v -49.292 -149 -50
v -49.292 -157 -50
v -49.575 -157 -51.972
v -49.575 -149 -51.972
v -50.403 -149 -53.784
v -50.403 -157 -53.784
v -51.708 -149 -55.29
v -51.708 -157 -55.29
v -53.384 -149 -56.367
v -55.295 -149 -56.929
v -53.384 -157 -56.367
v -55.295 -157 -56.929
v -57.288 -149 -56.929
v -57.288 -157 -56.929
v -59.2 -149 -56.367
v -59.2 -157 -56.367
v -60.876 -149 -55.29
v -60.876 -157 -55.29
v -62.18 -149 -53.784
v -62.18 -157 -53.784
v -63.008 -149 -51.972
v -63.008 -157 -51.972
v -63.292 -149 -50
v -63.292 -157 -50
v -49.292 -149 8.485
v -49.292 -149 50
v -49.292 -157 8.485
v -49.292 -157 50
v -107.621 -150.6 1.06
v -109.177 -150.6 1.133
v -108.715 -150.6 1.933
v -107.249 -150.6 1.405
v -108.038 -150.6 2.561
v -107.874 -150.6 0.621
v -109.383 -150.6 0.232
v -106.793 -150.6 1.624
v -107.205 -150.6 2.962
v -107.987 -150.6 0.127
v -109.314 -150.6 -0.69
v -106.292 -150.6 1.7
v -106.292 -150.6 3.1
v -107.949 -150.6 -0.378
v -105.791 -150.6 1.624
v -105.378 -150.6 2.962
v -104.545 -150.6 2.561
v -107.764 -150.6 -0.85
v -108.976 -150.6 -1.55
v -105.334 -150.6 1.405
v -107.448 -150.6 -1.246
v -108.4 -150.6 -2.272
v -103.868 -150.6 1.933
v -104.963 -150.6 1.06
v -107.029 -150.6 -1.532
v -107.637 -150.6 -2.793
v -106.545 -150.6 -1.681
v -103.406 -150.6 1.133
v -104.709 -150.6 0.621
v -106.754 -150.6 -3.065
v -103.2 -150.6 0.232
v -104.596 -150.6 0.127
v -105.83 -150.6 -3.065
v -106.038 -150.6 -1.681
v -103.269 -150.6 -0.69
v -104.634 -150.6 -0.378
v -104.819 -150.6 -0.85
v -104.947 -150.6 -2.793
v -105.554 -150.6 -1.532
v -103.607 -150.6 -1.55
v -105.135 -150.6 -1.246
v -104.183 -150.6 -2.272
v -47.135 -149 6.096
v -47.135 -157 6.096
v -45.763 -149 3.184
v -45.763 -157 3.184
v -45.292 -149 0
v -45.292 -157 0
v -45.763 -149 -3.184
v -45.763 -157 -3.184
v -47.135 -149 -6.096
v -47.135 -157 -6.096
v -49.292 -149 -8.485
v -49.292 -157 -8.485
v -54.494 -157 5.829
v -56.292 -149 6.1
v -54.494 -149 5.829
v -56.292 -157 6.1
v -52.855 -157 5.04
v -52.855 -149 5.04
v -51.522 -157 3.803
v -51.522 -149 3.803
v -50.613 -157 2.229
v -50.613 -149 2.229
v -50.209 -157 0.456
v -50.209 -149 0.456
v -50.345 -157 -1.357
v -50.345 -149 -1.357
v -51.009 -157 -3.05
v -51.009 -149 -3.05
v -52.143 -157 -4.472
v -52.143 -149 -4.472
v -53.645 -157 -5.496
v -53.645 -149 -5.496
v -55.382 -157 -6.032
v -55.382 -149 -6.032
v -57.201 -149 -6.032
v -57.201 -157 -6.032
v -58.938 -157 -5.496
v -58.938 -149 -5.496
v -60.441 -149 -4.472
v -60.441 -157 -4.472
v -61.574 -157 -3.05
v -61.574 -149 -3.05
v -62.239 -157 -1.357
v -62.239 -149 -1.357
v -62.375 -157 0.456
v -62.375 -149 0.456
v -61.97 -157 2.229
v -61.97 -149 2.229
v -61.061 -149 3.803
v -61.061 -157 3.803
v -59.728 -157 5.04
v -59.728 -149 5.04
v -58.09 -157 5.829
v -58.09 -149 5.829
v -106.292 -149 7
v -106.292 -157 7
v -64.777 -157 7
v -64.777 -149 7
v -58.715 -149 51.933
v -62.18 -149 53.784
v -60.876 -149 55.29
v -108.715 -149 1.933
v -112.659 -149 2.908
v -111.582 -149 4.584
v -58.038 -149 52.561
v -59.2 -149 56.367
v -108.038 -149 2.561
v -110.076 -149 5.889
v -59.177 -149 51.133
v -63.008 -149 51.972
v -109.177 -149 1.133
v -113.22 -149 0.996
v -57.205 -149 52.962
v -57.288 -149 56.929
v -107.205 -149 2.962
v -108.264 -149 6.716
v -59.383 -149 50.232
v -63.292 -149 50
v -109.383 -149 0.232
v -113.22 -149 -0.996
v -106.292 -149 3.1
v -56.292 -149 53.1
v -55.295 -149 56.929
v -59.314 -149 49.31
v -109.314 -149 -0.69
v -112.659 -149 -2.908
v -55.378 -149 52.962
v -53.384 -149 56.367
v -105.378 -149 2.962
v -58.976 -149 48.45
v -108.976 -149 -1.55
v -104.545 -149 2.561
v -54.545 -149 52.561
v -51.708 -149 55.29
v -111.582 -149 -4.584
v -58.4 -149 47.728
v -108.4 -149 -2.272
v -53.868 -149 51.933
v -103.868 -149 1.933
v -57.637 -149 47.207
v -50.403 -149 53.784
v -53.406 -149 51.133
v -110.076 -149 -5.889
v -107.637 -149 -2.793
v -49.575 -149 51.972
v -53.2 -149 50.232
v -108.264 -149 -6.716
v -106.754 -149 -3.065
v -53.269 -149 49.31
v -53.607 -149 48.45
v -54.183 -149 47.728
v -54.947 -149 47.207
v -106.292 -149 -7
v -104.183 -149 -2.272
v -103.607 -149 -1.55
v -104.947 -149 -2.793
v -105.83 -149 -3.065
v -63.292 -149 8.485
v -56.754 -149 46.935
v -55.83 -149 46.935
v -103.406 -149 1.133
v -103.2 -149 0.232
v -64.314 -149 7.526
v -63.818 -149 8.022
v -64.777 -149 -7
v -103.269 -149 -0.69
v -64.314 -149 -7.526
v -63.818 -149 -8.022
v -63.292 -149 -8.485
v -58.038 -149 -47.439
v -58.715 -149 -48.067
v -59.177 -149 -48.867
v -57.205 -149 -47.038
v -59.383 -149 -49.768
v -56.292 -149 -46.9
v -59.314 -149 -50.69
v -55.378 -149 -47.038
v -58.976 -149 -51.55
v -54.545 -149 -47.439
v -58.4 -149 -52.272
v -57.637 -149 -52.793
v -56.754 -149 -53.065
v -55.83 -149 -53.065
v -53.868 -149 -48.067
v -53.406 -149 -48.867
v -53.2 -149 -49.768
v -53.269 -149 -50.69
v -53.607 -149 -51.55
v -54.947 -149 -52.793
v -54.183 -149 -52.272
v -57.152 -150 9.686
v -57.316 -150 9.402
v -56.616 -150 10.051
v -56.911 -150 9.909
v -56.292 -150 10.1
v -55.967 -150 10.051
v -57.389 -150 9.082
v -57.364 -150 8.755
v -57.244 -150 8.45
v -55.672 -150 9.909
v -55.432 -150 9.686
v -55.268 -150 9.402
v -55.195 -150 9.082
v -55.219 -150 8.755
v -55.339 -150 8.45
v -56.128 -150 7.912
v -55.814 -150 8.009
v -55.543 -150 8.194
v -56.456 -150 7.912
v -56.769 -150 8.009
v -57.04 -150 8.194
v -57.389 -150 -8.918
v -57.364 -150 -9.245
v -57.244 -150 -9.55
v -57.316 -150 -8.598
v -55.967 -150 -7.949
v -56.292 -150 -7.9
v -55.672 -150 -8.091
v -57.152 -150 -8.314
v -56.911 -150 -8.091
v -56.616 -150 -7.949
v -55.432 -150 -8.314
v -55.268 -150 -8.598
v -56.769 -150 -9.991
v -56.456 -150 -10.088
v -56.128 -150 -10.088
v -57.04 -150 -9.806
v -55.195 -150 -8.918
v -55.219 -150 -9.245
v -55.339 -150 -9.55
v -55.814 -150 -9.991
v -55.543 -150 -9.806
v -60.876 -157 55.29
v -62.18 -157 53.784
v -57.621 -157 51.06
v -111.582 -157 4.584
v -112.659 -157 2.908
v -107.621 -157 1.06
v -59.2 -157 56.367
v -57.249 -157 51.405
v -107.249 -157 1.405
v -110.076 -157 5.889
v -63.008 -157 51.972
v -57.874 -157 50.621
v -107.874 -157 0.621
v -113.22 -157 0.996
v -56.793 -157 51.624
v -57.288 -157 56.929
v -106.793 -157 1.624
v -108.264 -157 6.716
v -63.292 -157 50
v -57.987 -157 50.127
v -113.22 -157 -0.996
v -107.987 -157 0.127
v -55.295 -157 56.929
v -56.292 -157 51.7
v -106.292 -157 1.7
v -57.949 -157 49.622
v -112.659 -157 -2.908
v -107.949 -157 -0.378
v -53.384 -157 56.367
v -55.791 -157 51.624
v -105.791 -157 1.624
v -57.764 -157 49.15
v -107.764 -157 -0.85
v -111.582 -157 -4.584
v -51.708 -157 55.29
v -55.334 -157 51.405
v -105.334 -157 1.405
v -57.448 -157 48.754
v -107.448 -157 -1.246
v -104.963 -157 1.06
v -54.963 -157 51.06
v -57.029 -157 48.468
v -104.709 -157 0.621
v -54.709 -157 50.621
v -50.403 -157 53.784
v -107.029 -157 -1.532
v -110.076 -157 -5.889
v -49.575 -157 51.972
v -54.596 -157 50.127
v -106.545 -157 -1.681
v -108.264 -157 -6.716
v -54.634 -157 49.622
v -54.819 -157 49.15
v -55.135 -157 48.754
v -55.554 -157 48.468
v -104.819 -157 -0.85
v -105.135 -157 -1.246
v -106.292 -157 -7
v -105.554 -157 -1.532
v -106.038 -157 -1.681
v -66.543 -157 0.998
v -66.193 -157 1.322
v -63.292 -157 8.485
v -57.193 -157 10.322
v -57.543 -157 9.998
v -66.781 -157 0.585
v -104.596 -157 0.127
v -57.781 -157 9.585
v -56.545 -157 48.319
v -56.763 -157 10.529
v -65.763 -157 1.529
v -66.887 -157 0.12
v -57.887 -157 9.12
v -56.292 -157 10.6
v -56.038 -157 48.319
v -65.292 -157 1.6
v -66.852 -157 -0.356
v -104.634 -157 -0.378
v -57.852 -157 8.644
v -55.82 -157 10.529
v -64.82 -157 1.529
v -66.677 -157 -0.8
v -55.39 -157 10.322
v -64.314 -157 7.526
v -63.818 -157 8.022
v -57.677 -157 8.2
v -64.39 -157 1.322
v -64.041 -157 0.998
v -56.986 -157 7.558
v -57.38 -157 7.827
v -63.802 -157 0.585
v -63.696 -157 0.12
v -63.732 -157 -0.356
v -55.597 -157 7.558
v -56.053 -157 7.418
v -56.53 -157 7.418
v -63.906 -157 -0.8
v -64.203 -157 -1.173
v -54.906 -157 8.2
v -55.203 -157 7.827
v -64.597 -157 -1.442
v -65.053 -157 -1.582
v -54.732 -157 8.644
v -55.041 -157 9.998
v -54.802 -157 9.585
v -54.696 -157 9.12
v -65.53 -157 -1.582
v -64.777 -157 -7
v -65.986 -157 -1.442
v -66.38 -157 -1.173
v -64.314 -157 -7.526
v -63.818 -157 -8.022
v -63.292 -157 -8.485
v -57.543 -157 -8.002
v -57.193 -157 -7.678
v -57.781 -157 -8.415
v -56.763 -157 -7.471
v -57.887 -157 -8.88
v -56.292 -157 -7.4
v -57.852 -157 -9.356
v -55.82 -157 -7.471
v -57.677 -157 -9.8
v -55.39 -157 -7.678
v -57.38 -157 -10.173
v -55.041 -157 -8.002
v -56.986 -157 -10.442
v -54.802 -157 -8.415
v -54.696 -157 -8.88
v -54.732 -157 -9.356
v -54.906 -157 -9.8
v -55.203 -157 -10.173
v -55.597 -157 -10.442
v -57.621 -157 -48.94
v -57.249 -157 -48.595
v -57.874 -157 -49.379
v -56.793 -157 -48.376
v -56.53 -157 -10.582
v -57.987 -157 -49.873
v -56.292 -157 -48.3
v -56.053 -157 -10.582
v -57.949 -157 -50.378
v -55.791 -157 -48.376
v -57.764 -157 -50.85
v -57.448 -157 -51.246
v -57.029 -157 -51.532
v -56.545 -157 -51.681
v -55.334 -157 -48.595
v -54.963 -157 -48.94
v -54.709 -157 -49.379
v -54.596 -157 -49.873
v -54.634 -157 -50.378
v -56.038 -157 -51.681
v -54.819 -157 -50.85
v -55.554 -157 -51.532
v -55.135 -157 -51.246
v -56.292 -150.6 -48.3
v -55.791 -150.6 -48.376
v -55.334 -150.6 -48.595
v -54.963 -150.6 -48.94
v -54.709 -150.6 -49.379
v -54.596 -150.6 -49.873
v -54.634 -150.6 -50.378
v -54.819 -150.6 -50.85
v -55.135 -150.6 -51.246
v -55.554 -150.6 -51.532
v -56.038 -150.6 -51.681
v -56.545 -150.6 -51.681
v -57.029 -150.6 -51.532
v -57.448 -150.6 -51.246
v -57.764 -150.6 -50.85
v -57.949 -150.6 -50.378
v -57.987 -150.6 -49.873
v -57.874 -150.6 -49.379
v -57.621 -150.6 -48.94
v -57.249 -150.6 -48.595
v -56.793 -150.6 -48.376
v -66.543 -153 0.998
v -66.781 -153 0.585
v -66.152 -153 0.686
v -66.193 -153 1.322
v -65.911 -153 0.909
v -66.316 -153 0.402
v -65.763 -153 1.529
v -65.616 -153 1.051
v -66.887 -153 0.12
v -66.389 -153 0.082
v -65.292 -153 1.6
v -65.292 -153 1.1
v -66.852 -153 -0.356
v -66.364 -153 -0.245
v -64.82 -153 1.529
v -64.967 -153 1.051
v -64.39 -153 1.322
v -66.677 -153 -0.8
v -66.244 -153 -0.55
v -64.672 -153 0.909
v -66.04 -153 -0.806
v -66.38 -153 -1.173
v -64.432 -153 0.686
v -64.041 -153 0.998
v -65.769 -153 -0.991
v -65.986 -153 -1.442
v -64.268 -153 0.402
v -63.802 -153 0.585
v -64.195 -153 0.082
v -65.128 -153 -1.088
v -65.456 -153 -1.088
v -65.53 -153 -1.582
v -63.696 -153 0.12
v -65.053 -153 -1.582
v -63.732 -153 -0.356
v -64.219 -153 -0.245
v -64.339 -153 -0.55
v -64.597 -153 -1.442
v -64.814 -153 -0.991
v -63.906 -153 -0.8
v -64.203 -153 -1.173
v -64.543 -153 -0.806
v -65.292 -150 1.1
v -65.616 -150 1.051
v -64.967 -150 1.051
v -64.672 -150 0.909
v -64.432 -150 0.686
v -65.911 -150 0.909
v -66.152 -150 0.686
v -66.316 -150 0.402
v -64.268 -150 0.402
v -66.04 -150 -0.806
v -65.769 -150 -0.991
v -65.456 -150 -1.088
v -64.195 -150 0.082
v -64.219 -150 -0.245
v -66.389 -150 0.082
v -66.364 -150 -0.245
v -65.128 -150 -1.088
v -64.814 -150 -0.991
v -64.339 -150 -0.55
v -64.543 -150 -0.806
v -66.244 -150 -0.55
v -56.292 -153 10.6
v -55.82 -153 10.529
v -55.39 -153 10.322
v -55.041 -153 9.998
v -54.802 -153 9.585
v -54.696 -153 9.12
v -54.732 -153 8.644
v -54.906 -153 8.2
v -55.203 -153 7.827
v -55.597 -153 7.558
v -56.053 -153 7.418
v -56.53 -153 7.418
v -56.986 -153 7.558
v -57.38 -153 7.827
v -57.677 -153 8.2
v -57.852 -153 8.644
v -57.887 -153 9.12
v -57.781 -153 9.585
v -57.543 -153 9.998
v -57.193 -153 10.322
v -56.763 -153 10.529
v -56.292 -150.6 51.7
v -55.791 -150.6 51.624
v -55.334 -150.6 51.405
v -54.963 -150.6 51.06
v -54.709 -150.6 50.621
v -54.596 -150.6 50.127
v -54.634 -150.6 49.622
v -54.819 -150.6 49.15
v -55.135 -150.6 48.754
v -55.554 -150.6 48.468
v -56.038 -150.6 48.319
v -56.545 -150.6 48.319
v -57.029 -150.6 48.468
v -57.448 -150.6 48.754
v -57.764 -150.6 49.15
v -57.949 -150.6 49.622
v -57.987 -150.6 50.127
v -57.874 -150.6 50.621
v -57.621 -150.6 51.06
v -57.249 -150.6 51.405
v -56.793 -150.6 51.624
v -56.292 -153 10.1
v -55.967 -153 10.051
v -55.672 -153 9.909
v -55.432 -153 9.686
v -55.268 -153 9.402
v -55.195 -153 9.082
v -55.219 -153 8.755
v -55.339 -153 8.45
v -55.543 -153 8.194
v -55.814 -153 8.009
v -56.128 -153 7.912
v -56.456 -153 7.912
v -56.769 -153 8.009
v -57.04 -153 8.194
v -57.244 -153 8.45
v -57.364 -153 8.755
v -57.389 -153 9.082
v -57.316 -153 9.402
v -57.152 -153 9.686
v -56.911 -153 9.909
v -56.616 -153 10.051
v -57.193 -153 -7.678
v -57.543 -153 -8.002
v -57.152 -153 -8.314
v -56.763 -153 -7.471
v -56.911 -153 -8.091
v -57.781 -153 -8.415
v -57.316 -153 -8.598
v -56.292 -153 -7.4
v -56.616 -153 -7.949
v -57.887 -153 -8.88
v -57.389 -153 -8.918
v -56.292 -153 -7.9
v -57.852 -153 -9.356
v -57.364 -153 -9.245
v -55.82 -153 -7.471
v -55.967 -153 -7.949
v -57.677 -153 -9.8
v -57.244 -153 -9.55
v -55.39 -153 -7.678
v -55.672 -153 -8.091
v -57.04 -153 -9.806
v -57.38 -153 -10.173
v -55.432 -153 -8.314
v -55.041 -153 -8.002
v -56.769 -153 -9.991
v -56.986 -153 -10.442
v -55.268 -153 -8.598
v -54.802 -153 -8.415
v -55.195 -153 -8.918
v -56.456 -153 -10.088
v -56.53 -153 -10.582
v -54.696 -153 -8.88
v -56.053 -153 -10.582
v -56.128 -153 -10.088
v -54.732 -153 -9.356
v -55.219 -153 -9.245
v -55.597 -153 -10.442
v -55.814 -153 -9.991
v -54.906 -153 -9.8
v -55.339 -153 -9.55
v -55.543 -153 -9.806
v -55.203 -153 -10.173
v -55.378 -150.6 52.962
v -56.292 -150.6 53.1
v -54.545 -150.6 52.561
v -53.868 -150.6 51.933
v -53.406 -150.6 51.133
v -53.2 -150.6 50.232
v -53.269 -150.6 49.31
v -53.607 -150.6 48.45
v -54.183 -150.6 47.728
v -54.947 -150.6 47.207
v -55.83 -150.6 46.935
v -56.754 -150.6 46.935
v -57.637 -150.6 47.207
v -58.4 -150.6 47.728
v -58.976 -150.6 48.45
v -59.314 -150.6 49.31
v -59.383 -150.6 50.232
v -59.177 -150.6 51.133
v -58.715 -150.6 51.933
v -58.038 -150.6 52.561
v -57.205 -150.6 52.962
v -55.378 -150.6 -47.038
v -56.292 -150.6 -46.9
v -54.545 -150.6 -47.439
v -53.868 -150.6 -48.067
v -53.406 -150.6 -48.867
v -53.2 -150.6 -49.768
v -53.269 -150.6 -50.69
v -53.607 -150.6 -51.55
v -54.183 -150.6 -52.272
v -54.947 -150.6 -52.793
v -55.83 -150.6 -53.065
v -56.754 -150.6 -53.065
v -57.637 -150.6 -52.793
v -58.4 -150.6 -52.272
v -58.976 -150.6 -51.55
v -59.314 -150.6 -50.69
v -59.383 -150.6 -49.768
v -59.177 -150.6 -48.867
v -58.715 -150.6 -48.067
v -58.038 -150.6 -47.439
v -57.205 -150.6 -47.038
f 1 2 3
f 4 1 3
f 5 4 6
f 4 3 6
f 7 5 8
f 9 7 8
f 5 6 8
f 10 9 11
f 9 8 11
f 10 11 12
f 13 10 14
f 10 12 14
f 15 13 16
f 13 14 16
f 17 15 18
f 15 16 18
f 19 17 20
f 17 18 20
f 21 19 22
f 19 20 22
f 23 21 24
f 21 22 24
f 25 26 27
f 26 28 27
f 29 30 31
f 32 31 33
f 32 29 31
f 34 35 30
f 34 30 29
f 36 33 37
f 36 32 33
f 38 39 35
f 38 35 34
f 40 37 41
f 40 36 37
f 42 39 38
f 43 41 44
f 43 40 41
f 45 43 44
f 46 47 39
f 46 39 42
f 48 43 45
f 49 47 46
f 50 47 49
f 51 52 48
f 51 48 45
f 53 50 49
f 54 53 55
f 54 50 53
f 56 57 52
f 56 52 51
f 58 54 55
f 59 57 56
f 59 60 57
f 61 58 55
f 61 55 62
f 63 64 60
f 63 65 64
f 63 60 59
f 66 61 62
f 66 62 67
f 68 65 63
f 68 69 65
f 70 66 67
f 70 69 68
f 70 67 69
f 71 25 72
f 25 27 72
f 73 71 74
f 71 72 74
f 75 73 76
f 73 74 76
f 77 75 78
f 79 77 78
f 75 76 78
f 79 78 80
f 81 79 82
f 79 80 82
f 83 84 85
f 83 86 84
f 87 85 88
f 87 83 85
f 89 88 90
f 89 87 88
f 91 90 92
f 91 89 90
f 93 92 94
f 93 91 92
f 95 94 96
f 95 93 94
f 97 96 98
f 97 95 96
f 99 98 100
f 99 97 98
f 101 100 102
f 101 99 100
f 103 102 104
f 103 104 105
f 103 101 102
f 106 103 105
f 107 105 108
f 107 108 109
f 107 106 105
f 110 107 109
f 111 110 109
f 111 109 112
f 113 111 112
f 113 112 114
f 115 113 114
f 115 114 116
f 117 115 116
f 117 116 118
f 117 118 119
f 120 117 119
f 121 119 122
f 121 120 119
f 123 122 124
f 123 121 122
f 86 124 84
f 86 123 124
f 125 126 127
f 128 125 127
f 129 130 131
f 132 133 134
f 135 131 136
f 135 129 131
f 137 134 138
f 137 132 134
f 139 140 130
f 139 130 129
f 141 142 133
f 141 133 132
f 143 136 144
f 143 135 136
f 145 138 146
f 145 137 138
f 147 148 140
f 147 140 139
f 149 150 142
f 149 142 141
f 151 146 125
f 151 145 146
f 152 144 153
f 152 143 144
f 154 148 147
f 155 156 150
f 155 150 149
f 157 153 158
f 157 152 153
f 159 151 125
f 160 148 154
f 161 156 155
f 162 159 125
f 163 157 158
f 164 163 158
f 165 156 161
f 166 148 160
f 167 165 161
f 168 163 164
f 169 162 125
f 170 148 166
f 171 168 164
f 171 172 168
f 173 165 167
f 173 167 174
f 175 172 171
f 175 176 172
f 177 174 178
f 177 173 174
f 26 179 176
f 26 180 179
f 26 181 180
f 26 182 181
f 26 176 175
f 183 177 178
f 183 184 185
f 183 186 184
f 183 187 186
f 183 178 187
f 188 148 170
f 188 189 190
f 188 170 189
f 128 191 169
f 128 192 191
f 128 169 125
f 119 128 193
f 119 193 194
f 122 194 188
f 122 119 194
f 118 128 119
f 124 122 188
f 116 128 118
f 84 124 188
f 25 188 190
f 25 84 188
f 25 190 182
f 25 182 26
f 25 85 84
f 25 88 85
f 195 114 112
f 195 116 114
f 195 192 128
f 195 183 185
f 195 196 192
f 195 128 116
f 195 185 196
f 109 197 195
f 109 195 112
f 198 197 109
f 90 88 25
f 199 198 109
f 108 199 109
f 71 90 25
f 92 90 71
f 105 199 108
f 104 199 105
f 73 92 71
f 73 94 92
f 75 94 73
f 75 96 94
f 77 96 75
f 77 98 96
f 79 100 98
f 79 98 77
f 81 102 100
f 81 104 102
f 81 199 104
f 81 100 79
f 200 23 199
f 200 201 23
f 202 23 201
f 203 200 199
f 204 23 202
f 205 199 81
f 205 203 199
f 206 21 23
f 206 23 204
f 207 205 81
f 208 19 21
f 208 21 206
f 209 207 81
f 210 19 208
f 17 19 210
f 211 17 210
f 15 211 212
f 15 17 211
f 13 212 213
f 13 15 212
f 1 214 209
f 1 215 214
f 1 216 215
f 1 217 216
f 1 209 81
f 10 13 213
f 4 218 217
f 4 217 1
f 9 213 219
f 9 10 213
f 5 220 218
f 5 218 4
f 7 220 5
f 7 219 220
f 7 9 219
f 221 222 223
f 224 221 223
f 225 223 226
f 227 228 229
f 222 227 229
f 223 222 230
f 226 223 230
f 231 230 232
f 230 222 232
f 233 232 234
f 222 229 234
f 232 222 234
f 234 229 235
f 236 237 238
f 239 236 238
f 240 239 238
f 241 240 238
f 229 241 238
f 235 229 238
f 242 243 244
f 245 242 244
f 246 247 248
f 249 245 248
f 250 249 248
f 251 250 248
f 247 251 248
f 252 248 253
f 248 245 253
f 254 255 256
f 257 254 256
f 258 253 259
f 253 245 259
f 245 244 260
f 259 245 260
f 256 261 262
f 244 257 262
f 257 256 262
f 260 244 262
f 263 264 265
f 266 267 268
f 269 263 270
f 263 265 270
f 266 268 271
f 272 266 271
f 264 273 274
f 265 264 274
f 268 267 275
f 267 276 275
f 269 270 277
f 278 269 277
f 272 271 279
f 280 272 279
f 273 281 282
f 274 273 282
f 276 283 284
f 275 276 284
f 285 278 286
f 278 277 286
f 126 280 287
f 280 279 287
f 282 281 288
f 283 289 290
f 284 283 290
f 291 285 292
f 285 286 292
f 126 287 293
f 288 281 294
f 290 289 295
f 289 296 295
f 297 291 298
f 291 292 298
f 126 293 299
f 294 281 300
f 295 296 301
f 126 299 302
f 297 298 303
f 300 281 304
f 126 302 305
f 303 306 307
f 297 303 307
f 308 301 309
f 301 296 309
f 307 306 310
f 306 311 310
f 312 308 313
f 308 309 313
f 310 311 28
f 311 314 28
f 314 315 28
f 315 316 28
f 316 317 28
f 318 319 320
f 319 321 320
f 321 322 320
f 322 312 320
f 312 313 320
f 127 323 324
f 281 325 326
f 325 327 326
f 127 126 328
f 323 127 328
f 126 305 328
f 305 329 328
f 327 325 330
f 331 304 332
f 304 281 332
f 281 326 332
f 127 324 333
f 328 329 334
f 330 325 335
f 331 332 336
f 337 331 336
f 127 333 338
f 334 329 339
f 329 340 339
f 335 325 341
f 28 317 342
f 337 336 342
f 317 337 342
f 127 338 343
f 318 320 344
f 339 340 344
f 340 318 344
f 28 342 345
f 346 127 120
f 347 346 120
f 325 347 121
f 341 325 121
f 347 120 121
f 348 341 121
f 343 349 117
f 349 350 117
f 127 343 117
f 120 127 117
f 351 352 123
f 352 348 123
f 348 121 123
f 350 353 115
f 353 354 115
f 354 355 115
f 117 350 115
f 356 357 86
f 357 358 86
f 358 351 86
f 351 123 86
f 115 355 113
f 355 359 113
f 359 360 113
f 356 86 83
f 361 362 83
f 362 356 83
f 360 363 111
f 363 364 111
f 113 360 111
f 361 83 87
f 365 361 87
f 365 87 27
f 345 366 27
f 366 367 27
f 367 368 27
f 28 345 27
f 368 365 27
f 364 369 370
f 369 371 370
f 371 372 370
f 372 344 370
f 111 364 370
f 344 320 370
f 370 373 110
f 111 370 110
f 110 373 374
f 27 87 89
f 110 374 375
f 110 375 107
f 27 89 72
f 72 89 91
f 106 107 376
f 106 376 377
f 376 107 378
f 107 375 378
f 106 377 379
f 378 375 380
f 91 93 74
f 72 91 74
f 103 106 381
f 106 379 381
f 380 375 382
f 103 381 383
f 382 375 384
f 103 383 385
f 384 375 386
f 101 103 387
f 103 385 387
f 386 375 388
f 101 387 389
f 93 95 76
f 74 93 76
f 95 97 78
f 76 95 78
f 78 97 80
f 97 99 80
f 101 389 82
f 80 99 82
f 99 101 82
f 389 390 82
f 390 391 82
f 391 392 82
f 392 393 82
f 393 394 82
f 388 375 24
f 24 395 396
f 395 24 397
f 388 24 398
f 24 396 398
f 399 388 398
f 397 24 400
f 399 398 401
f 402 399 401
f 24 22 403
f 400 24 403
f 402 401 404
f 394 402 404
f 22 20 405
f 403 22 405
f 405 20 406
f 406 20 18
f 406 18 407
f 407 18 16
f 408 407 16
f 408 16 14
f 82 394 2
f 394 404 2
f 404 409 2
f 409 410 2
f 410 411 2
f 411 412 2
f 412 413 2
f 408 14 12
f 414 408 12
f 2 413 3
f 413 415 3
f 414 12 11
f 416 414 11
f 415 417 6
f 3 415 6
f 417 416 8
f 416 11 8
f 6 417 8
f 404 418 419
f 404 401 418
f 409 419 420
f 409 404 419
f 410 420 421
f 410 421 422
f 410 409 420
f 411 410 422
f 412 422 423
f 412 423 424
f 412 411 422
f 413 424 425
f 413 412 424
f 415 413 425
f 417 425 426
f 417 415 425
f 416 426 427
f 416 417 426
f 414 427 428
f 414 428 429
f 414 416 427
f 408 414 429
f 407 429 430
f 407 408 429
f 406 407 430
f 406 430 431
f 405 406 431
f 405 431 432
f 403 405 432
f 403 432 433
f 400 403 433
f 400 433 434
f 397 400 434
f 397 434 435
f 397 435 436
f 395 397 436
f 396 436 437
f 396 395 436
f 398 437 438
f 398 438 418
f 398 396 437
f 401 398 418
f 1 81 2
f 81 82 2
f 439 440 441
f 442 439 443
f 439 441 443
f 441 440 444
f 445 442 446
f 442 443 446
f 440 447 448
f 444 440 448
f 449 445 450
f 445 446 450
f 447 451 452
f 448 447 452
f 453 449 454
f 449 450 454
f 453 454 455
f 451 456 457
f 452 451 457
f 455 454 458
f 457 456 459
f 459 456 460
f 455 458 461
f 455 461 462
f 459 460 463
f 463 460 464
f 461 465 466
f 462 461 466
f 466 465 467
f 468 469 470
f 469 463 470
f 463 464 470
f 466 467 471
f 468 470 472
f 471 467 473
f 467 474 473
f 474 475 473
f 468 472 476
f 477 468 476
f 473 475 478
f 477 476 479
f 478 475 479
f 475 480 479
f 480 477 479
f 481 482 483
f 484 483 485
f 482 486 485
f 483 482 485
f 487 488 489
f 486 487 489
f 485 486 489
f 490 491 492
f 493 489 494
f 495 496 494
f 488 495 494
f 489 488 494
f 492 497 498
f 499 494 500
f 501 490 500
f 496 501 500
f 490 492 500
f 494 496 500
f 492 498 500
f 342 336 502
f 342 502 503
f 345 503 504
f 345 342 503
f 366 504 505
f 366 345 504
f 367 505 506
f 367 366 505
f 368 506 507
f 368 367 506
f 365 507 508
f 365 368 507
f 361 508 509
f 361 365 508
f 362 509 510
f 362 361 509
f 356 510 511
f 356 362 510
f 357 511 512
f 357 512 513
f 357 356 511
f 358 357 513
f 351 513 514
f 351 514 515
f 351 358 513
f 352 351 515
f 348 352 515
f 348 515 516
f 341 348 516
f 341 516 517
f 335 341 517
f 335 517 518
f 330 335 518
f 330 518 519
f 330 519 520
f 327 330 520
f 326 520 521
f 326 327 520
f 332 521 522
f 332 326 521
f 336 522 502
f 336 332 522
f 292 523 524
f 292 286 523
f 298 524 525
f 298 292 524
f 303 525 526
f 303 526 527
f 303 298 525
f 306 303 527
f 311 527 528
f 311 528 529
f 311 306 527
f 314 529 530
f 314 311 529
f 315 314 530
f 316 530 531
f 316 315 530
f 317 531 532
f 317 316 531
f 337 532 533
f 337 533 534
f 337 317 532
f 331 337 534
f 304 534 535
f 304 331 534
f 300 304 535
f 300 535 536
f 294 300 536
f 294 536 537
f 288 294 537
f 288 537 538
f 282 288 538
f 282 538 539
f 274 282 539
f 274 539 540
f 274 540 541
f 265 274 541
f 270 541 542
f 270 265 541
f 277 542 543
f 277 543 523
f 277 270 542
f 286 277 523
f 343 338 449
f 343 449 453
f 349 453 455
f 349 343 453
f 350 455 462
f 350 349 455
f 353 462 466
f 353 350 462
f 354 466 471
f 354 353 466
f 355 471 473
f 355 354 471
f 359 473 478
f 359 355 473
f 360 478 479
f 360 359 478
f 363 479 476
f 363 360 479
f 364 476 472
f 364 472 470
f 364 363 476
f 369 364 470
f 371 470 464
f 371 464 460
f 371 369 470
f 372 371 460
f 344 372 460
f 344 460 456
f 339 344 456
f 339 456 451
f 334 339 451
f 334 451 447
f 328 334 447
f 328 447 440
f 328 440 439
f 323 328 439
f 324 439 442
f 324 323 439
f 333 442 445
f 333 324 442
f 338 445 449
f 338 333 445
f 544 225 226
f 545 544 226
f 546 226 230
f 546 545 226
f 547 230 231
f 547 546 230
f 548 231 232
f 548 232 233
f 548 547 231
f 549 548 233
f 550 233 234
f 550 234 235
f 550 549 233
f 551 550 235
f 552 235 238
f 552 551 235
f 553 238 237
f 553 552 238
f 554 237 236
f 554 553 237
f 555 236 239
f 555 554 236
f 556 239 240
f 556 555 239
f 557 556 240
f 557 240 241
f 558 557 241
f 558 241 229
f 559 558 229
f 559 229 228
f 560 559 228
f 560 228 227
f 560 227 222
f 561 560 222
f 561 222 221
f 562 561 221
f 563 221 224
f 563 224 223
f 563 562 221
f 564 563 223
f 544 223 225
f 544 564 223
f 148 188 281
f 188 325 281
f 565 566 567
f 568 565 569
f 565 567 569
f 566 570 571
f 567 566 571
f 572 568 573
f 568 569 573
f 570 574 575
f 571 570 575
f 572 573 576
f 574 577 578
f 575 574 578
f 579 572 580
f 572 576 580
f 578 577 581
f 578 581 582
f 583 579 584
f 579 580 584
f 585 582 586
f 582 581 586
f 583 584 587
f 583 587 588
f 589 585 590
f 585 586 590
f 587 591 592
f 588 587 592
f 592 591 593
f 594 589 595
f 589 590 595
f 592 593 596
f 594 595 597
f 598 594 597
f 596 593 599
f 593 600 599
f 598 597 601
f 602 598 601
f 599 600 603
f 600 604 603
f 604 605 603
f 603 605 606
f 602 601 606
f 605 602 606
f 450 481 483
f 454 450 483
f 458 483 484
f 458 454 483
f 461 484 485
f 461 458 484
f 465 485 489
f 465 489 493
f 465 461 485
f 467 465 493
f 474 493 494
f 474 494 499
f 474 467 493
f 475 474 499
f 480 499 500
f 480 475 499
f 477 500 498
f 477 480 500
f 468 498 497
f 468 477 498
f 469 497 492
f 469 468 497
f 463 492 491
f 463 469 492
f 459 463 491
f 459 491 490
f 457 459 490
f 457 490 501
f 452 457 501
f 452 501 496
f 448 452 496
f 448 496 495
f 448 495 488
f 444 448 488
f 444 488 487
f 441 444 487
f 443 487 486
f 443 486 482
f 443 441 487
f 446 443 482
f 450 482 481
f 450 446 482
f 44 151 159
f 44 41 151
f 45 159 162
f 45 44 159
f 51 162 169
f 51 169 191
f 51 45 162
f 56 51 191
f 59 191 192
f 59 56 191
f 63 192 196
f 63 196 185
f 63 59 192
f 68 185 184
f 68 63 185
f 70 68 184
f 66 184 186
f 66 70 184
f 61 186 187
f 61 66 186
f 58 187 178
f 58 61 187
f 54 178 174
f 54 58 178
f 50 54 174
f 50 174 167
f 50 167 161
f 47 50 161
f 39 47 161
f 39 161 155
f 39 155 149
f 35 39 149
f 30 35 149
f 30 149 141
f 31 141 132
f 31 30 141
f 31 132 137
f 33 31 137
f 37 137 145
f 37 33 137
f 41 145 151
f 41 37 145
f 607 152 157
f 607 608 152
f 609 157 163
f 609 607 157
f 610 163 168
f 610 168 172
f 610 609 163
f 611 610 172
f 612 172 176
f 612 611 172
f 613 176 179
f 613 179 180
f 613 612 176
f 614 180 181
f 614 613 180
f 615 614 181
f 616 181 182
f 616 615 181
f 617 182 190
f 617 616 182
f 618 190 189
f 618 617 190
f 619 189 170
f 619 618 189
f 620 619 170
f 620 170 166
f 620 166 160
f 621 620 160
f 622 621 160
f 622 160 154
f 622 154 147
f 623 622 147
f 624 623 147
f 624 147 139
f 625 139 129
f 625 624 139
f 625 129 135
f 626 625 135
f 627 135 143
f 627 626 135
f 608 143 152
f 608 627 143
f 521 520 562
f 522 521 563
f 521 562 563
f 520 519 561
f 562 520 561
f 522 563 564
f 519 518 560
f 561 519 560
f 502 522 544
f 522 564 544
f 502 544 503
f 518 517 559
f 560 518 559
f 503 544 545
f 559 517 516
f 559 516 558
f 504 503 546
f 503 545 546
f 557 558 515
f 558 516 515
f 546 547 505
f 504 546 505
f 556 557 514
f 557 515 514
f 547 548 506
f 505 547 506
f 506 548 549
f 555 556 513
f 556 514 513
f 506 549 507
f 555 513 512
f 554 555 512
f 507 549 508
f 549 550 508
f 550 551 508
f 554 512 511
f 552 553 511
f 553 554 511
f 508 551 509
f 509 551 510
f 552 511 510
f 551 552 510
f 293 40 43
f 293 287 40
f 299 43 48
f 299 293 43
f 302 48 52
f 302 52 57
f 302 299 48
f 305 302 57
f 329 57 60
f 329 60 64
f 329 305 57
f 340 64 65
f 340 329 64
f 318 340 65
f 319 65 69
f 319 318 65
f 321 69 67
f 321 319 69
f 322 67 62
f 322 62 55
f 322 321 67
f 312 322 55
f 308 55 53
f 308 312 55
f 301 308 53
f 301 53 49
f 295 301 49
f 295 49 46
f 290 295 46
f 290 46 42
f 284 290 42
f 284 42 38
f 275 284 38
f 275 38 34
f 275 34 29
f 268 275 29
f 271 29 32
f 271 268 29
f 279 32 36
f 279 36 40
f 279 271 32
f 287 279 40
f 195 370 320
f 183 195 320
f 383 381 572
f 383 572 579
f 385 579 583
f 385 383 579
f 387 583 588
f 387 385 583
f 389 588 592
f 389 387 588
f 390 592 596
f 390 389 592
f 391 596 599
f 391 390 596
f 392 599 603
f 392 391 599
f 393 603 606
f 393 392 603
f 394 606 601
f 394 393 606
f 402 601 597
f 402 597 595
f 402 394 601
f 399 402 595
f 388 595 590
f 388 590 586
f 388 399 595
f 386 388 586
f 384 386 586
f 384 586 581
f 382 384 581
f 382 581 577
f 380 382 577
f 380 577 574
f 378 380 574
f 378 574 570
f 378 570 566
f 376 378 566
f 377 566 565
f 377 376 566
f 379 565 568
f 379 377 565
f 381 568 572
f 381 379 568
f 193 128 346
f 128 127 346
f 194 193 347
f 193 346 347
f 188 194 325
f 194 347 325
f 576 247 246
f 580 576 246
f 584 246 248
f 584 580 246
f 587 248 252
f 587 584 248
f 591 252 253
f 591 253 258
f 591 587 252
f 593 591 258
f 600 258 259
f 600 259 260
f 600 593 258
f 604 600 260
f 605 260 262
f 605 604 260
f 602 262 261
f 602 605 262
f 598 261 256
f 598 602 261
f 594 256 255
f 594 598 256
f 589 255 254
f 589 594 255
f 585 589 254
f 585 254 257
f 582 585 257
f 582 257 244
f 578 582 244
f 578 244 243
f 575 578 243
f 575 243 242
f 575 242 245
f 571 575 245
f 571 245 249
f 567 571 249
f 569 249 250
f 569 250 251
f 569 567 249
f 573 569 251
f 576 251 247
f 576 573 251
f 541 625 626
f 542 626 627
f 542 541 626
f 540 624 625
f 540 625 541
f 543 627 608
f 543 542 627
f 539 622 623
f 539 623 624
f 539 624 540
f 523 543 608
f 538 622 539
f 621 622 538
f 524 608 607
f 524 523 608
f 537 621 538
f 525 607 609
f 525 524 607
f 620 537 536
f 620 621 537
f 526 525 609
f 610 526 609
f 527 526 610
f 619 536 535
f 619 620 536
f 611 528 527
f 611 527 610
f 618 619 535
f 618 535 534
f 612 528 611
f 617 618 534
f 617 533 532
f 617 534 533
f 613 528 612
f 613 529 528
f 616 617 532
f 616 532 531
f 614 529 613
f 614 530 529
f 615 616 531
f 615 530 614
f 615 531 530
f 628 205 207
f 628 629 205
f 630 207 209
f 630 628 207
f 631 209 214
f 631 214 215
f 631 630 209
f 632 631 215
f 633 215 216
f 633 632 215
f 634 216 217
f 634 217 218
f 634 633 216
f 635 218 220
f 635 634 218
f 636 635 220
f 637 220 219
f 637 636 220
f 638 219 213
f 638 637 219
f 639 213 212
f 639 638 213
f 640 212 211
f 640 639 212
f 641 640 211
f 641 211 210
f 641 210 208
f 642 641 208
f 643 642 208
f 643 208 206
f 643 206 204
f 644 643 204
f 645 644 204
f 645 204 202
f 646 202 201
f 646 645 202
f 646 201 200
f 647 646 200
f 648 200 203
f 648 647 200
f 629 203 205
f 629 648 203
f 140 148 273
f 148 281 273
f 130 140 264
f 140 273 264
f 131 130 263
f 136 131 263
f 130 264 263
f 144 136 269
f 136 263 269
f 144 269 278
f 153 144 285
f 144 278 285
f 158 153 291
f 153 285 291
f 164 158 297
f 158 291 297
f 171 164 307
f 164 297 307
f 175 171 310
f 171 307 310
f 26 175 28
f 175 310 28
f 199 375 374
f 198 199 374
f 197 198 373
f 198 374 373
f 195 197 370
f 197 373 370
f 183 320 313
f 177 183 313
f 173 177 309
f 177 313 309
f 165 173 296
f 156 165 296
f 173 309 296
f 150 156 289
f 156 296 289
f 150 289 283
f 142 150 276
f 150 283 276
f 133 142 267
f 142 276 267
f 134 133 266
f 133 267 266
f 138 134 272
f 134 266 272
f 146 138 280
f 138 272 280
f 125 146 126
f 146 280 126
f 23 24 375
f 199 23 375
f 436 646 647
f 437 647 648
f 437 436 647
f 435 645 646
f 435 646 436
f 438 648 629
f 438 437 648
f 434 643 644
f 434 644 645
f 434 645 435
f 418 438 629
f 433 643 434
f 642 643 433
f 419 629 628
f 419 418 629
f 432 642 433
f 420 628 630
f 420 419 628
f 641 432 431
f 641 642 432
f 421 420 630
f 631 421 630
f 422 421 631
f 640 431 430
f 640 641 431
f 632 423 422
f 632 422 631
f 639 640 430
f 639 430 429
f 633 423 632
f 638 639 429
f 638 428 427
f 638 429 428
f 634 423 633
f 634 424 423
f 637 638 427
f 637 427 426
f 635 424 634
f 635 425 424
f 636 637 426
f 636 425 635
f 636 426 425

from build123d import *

# Parameters (mm, degrees)
BASE_OUTLINE_SKETCH_R          = 1.7
BASE_OUTLINE_SKETCH_R_2        = 6.1
BASE_OUTLINE_SKETCH_R_3        = 1.6
BASE_OUTLINE_DEPTH             = 4
INTERFACE_PROFILE_2_SKETCH_R   = 1.7
INTERFACE_PROFILE_2_SKETCH_R_2 = 6.1
INTERFACE_PROFILE_2_SKETCH_R_3 = 1.1
INTERFACE_PROFILE_2_DEPTH      = 2.4
INTERFACE_PROFILE_3_SKETCH_R   = 6.1
INTERFACE_PROFILE_3_SKETCH_R_2 = 3.1
INTERFACE_PROFILE_3_SKETCH_R_3 = 1.1
INTERFACE_PROFILE_3_DEPTH      = 0.6
INTERFACE_PROFILE_4_SKETCH_R   = 6.1
INTERFACE_PROFILE_4_SKETCH_R_2 = 3.1
INTERFACE_PROFILE_4_DEPTH      = 1


with BuildPart() as part:
    # Base Outline Sketch → Base Outline (new body)
    with BuildSketch(Plane(origin=(0, -157, 0), x_dir=(1, 0, 0), z_dir=(0, 1, 0))):
        with BuildLine():
            Line((-106.291651246, -7), (-64.77693262, -7))
            ThreePointArc((-64.77693262, -7), (-64.069825839, -7.778174593), (-63.291651246, -8.485281374))
            Line((-63.291651246, -8.485281374), (-63.291651246, -50))
            ThreePointArc((-63.291651246, -50), (-56.291651246, -57), (-49.291651246, -50))
            Line((-49.291651246, -50), (-49.291651246, -8.485281374))
            ThreePointArc((-49.291651246, -8.485281374), (-45.291651246, 0), (-49.291651246, 8.485281374))
            Line((-49.291651246, 8.485281374), (-49.291651246, 50))
            ThreePointArc((-49.291651246, 50), (-56.291651246, 57), (-63.291651246, 50))
            Line((-63.291651246, 50), (-63.291651246, 8.485281374))
            ThreePointArc((-63.291651246, 8.485281374), (-64.069825839, 7.778174593), (-64.77693262, 7))
            Line((-64.77693262, 7), (-106.291651246, 7))
            ThreePointArc((-106.291651246, 7), (-113.291651246, 0), (-106.291651246, -7))
        make_face()
        with Locations(Location((-106.291651246, 0, 0), (0, 0, 270))):
            Circle(BASE_OUTLINE_SKETCH_R, mode=Mode.SUBTRACT)
        with Locations(Location((-56.291651246, 50, 0), (0, 0, 270))):
            Circle(BASE_OUTLINE_SKETCH_R, mode=Mode.SUBTRACT)
        with Locations(Location((-56.291651246, 0, 0), (0, 0, 270))):
            Circle(BASE_OUTLINE_SKETCH_R_2, mode=Mode.SUBTRACT)
        with Locations(Location((-56.291651246, -50, 0), (0, 0, 270))):
            Circle(BASE_OUTLINE_SKETCH_R, mode=Mode.SUBTRACT)
        with Locations(Location((-65.291651246, 0, 0), (0, 0, 270))):
            Circle(BASE_OUTLINE_SKETCH_R_3, mode=Mode.SUBTRACT)
        with Locations(Location((-56.291651246, -9, 0), (0, 0, 270))):
            Circle(BASE_OUTLINE_SKETCH_R_3, mode=Mode.SUBTRACT)
        with Locations(Location((-56.291651246, 9, 0), (0, 0, 270))):
            Circle(BASE_OUTLINE_SKETCH_R_3, mode=Mode.SUBTRACT)
    extrude(amount=BASE_OUTLINE_DEPTH)

    # Interface Profile 2 Sketch → Interface Profile 2 (add)
    with BuildSketch(Plane(origin=(0, -153, 0), x_dir=(1, 0, 0), z_dir=(0, 1, 0))):
        with BuildLine():
            Line((-106.291651246, -7), (-64.77693262, -7))
            ThreePointArc((-64.77693262, -7), (-64.069825839, -7.778174593), (-63.291651246, -8.485281374))
            Line((-63.291651246, -8.485281374), (-63.291651246, -50))
            ThreePointArc((-63.291651246, -50), (-56.291651246, -57), (-49.291651246, -50))
            Line((-49.291651246, -50), (-49.291651246, -8.485281374))
            ThreePointArc((-49.291651246, -8.485281374), (-45.291651246, 0), (-49.291651246, 8.485281374))
            Line((-49.291651246, 8.485281374), (-49.291651246, 50))
            ThreePointArc((-49.291651246, 50), (-56.291651246, 57), (-63.291651246, 50))
            Line((-63.291651246, 50), (-63.291651246, 8.485281374))
            ThreePointArc((-63.291651246, 8.485281374), (-64.069825839, 7.778174593), (-64.77693262, 7))
            Line((-64.77693262, 7), (-106.291651246, 7))
            ThreePointArc((-106.291651246, 7), (-113.291651246, 0), (-106.291651246, -7))
        make_face()
        with Locations(Location((-106.291651246, 0, 0), (0, 0, 270))):
            Circle(INTERFACE_PROFILE_2_SKETCH_R, mode=Mode.SUBTRACT)
        with Locations(Location((-56.291651246, 50, 0), (0, 0, 270))):
            Circle(INTERFACE_PROFILE_2_SKETCH_R, mode=Mode.SUBTRACT)
        with Locations(Location((-56.291651246, 0, 0), (0, 0, 270))):
            Circle(INTERFACE_PROFILE_2_SKETCH_R_2, mode=Mode.SUBTRACT)
        with Locations(Location((-56.291651246, -50, 0), (0, 0, 270))):
            Circle(INTERFACE_PROFILE_2_SKETCH_R, mode=Mode.SUBTRACT)
        with Locations(Location((-65.291651246, 0, 0), (0, 0, 270))):
            Circle(INTERFACE_PROFILE_2_SKETCH_R_3, mode=Mode.SUBTRACT)
        with Locations(Location((-56.291651246, -9, 0), (0, 0, 270))):
            Circle(INTERFACE_PROFILE_2_SKETCH_R_3, mode=Mode.SUBTRACT)
        with Locations(Location((-56.291651246, 9, 0), (0, 0, 270))):
            Circle(INTERFACE_PROFILE_2_SKETCH_R_3, mode=Mode.SUBTRACT)
    extrude(amount=INTERFACE_PROFILE_2_DEPTH)

    # Interface Profile 3 Sketch → Interface Profile 3 (add)
    with BuildSketch(Plane(origin=(0, -150.6, 0), x_dir=(1, 0, 0), z_dir=(0, 1, 0))):
        with BuildLine():
            Line((-106.291651246, -7), (-64.77693262, -7))
            ThreePointArc((-64.77693262, -7), (-64.069825839, -7.778174593), (-63.291651246, -8.485281374))
            Line((-63.291651246, -8.485281374), (-63.291651246, -50))
            ThreePointArc((-63.291651246, -50), (-56.291651246, -57), (-49.291651246, -50))
            Line((-49.291651246, -50), (-49.291651246, -8.485281374))
            ThreePointArc((-49.291651246, -8.485281374), (-45.291651246, 0), (-49.291651246, 8.485281374))
            Line((-49.291651246, 8.485281374), (-49.291651246, 50))
            ThreePointArc((-49.291651246, 50), (-56.291651246, 57), (-63.291651246, 50))
            Line((-63.291651246, 50), (-63.291651246, 8.485281374))
            ThreePointArc((-63.291651246, 8.485281374), (-64.069825839, 7.778174593), (-64.77693262, 7))
            Line((-64.77693262, 7), (-106.291651246, 7))
            ThreePointArc((-106.291651246, 7), (-113.291651246, 0), (-106.291651246, -7))
        make_face()
        with Locations(Location((-56.291651246, 0, 0), (0, 0, 270))):
            Circle(INTERFACE_PROFILE_3_SKETCH_R, mode=Mode.SUBTRACT)
        with Locations(Location((-106.291651246, 0, 0), (0, 0, 270))):
            Circle(INTERFACE_PROFILE_3_SKETCH_R_2, mode=Mode.SUBTRACT)
        with Locations(Location((-56.291651246, 50, 0), (0, 0, 270))):
            Circle(INTERFACE_PROFILE_3_SKETCH_R_2, mode=Mode.SUBTRACT)
        with Locations(Location((-56.291651246, -50, 0), (0, 0, 270))):
            Circle(INTERFACE_PROFILE_3_SKETCH_R_2, mode=Mode.SUBTRACT)
        with Locations(Location((-65.291651246, 0, 0), (0, 0, 270))):
            Circle(INTERFACE_PROFILE_3_SKETCH_R_3, mode=Mode.SUBTRACT)
        with Locations(Location((-56.291651246, -9, 0), (0, 0, 270))):
            Circle(INTERFACE_PROFILE_3_SKETCH_R_3, mode=Mode.SUBTRACT)
        with Locations(Location((-56.291651246, 9, 0), (0, 0, 270))):
            Circle(INTERFACE_PROFILE_3_SKETCH_R_3, mode=Mode.SUBTRACT)
    extrude(amount=INTERFACE_PROFILE_3_DEPTH)

    # Interface Profile 4 Sketch → Interface Profile 4 (add)
    with BuildSketch(Plane(origin=(0, -150, 0), x_dir=(1, 0, 0), z_dir=(0, 1, 0))):
        with BuildLine():
            Line((-106.291651246, -7), (-64.77693262, -7))
            ThreePointArc((-64.77693262, -7), (-64.069825839, -7.778174593), (-63.291651246, -8.485281374))
            Line((-63.291651246, -8.485281374), (-63.291651246, -50))
            ThreePointArc((-63.291651246, -50), (-56.291651246, -57), (-49.291651246, -50))
            Line((-49.291651246, -50), (-49.291651246, -8.485281374))
            ThreePointArc((-49.291651246, -8.485281374), (-45.291651246, 0), (-49.291651246, 8.485281374))
            Line((-49.291651246, 8.485281374), (-49.291651246, 50))
            ThreePointArc((-49.291651246, 50), (-56.291651246, 57), (-63.291651246, 50))
            Line((-63.291651246, 50), (-63.291651246, 8.485281374))
            ThreePointArc((-63.291651246, 8.485281374), (-64.069825839, 7.778174593), (-64.77693262, 7))
            Line((-64.77693262, 7), (-106.291651246, 7))
            ThreePointArc((-106.291651246, 7), (-113.291651246, 0), (-106.291651246, -7))
        make_face()
        with Locations(Location((-56.291651246, 0, 0), (0, 0, 270))):
            Circle(INTERFACE_PROFILE_4_SKETCH_R, mode=Mode.SUBTRACT)
        with Locations(Location((-106.291651246, 0, 0), (0, 0, 270))):
            Circle(INTERFACE_PROFILE_4_SKETCH_R_2, mode=Mode.SUBTRACT)
        with Locations(Location((-56.291651246, 50, 0), (0, 0, 270))):
            Circle(INTERFACE_PROFILE_4_SKETCH_R_2, mode=Mode.SUBTRACT)
        with Locations(Location((-56.291651246, -50, 0), (0, 0, 270))):
            Circle(INTERFACE_PROFILE_4_SKETCH_R_2, mode=Mode.SUBTRACT)
    extrude(amount=INTERFACE_PROFILE_4_DEPTH)


solid = part.part
